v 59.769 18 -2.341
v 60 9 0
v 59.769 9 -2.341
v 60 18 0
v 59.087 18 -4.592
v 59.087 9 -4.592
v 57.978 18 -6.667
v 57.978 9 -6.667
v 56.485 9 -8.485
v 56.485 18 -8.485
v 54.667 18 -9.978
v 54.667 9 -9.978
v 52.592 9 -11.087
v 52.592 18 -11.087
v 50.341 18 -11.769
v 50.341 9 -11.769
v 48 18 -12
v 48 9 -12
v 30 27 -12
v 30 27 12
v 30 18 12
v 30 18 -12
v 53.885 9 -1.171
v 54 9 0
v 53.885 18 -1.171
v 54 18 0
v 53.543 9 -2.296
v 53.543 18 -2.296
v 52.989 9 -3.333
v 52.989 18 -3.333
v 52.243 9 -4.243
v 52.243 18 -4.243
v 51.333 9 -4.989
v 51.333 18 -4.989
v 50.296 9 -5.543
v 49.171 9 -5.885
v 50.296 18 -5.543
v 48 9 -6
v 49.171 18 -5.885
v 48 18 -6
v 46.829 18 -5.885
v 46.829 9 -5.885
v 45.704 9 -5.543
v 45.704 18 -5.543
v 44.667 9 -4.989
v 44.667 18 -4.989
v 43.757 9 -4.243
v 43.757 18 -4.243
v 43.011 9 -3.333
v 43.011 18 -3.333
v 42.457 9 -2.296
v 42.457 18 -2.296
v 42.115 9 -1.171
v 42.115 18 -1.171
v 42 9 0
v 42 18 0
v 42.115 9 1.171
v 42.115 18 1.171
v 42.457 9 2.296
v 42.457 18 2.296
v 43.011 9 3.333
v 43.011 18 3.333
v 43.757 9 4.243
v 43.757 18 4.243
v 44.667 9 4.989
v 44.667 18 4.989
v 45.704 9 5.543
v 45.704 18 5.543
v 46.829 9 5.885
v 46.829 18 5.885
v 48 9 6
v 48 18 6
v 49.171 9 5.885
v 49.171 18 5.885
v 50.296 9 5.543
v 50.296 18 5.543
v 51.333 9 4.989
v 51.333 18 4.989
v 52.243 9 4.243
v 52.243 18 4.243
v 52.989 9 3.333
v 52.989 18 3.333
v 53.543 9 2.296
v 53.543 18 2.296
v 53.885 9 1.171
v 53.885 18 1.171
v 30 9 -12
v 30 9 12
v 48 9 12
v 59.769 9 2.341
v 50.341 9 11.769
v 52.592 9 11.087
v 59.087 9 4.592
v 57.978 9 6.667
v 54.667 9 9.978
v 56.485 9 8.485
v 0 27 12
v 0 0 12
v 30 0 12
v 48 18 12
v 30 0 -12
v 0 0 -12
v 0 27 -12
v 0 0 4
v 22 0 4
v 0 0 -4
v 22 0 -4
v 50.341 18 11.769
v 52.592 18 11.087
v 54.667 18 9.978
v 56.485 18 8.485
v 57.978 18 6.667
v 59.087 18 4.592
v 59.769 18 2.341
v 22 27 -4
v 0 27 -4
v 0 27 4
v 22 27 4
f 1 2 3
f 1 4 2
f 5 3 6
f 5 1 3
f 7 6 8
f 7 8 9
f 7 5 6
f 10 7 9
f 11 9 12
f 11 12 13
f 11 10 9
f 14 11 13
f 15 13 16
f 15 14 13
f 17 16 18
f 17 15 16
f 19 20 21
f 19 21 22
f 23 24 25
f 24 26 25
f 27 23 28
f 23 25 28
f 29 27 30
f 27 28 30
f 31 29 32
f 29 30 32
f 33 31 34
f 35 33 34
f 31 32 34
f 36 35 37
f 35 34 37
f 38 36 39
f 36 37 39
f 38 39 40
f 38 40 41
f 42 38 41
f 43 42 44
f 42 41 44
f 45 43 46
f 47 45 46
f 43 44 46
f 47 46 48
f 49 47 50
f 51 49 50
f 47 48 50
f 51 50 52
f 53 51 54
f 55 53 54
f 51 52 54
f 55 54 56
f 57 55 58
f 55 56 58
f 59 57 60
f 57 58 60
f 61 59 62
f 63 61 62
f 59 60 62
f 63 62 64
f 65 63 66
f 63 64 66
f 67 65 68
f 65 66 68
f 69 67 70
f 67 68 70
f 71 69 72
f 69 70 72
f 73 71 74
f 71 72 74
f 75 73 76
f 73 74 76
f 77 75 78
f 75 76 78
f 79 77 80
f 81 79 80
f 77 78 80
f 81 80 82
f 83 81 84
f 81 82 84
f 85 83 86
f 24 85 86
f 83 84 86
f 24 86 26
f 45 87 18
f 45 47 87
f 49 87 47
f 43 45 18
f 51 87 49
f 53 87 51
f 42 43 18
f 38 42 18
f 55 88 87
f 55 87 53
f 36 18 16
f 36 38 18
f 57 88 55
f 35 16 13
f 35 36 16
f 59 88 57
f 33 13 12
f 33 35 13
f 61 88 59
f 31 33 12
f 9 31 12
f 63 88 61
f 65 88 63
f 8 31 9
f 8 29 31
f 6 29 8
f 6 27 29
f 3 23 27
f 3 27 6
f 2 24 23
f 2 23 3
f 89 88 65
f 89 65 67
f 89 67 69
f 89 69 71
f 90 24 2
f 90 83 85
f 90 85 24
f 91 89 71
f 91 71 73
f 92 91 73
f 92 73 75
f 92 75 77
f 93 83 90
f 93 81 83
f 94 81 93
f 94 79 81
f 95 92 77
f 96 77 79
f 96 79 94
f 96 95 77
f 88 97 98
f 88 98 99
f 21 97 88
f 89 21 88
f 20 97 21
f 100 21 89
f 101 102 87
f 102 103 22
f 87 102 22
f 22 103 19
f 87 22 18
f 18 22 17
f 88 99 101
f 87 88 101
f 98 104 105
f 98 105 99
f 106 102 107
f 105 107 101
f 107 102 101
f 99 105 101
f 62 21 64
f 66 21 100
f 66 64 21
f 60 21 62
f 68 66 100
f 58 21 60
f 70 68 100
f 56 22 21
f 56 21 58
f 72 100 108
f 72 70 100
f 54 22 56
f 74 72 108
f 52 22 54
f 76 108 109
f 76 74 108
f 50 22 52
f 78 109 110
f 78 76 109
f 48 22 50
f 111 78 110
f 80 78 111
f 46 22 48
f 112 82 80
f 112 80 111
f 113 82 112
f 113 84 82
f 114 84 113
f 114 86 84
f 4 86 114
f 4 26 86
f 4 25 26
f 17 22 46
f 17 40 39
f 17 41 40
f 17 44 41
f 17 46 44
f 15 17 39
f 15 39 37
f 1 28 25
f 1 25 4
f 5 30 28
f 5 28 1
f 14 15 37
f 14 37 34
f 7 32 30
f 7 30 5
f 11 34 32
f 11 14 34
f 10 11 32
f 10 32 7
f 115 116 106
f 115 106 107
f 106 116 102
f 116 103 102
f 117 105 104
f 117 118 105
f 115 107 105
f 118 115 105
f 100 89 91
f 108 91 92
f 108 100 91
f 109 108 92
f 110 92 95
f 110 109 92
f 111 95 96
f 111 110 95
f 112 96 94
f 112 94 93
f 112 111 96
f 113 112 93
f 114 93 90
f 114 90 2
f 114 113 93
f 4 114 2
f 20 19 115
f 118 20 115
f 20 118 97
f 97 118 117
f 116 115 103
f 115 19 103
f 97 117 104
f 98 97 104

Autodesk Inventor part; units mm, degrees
ref_plane "YZ Plane" through (0, 0, 0) normal (1, 0, 0) x (0, 1, 0)
ref_plane "XZ Plane" through (0, 0, 0) normal (0, 1, 0) x (-1, 0, 0)
ref_plane "XY Plane" through (0, 0, 0) normal (0, 0, 1) x (1, 0, 0)
sketch "Sketch1" plane through (0, 0, 0) normal (0, 0, 1) x (1, 0, 0)
  line L0 (0, 0) -> (60, 0)
  line L1 (60, 0) -> (60, 27)
  line L2 (60, 27) -> (0, 27)
  line L3 (0, 27) -> (0, 0)
  dimension "d0" = 27
  dimension "d1" = 60
extrude "Extrusion1" add sketch "Sketch1" along normal mid plane 24
sketch "Sketch2" plane through (0, 27, 12) normal (0, 1, 0) x (1, 0, 0)
  line L0 (30, 26.8485) -> (66.8561, 26.8485)
  line L1 (66.8561, 26.8485) -> (66.8561, -1.1061)
  line L2 (66.8561, -1.1061) -> (30, -1.1061)
  line L3 (30, -1.1061) -> (30, 26.8485)
  line L4 (0, 24) -> (0, 0) projected
  point P0 (0, 12)
  dimension "d4" = 30
extrude "Extrusion2" cut sketch "Sketch2" against normal blind 9
sketch "Sketch3" plane through (0, 0, 12) normal (0, -1, 0) x (1, 0, 0)
  line L0 (64.8246, 8.5283) -> (30, 8.5283)
  line L1 (30, 8.5283) -> (30, -38.3826)
  line L2 (30, -38.3826) -> (64.8246, -38.3826)
  line L3 (64.8246, -38.3826) -> (64.8246, 8.5283)
  line L4 (0, -24) -> (0, 0) projected
  point P0 (0, -12)
  dimension "d7" = 30
extrude "Extrusion3" cut sketch "Sketch3" against normal blind 9
sketch "Sketch4" plane through (0, 18, 12) normal (0, 1, 0) x (1, 0, 0)
  circle A0 centre (48, 12) radius 6
  line L0 (30, 0) -> (30, 24) projected
  line L1 (30, 24) -> (60, 24) projected
  point P0 (0, 12)
  dimension "d10" = 12
  dimension "d11" = 18
  dimension "d12" = 12
extrude "Extrusion4" cut sketch "Sketch4" against normal blind 9
fillet "Fillet1" radius 12 1 edges at (60, 13.5, 12)
fillet "Fillet2" radius 12 1 edges at (60, 13.5, -12)
sketch "Sketch5" plane through (0, 27, 12) normal (0, 1, 0) x (1, 0, 0)
  line L0 (0, 16) -> (22, 16)
  line L1 (22, 16) -> (22, 8)
  line L2 (22, 8) -> (0, 8)
  line L3 (0, 8) -> (0, 16)
  line L4 (0, 24) -> (30, 24) projected
  line L5 (30, 0) -> (0, 0) projected
  line L6 (30, 0) -> (30, 24) projected
  point P0 (0, 12)
  dimension "d17" = 8
  dimension "d18" = 8
  dimension "d19" = 8
  dimension "d20" = 22
extrude "Extrusion5" cut sketch "Sketch5" against normal blind 27
